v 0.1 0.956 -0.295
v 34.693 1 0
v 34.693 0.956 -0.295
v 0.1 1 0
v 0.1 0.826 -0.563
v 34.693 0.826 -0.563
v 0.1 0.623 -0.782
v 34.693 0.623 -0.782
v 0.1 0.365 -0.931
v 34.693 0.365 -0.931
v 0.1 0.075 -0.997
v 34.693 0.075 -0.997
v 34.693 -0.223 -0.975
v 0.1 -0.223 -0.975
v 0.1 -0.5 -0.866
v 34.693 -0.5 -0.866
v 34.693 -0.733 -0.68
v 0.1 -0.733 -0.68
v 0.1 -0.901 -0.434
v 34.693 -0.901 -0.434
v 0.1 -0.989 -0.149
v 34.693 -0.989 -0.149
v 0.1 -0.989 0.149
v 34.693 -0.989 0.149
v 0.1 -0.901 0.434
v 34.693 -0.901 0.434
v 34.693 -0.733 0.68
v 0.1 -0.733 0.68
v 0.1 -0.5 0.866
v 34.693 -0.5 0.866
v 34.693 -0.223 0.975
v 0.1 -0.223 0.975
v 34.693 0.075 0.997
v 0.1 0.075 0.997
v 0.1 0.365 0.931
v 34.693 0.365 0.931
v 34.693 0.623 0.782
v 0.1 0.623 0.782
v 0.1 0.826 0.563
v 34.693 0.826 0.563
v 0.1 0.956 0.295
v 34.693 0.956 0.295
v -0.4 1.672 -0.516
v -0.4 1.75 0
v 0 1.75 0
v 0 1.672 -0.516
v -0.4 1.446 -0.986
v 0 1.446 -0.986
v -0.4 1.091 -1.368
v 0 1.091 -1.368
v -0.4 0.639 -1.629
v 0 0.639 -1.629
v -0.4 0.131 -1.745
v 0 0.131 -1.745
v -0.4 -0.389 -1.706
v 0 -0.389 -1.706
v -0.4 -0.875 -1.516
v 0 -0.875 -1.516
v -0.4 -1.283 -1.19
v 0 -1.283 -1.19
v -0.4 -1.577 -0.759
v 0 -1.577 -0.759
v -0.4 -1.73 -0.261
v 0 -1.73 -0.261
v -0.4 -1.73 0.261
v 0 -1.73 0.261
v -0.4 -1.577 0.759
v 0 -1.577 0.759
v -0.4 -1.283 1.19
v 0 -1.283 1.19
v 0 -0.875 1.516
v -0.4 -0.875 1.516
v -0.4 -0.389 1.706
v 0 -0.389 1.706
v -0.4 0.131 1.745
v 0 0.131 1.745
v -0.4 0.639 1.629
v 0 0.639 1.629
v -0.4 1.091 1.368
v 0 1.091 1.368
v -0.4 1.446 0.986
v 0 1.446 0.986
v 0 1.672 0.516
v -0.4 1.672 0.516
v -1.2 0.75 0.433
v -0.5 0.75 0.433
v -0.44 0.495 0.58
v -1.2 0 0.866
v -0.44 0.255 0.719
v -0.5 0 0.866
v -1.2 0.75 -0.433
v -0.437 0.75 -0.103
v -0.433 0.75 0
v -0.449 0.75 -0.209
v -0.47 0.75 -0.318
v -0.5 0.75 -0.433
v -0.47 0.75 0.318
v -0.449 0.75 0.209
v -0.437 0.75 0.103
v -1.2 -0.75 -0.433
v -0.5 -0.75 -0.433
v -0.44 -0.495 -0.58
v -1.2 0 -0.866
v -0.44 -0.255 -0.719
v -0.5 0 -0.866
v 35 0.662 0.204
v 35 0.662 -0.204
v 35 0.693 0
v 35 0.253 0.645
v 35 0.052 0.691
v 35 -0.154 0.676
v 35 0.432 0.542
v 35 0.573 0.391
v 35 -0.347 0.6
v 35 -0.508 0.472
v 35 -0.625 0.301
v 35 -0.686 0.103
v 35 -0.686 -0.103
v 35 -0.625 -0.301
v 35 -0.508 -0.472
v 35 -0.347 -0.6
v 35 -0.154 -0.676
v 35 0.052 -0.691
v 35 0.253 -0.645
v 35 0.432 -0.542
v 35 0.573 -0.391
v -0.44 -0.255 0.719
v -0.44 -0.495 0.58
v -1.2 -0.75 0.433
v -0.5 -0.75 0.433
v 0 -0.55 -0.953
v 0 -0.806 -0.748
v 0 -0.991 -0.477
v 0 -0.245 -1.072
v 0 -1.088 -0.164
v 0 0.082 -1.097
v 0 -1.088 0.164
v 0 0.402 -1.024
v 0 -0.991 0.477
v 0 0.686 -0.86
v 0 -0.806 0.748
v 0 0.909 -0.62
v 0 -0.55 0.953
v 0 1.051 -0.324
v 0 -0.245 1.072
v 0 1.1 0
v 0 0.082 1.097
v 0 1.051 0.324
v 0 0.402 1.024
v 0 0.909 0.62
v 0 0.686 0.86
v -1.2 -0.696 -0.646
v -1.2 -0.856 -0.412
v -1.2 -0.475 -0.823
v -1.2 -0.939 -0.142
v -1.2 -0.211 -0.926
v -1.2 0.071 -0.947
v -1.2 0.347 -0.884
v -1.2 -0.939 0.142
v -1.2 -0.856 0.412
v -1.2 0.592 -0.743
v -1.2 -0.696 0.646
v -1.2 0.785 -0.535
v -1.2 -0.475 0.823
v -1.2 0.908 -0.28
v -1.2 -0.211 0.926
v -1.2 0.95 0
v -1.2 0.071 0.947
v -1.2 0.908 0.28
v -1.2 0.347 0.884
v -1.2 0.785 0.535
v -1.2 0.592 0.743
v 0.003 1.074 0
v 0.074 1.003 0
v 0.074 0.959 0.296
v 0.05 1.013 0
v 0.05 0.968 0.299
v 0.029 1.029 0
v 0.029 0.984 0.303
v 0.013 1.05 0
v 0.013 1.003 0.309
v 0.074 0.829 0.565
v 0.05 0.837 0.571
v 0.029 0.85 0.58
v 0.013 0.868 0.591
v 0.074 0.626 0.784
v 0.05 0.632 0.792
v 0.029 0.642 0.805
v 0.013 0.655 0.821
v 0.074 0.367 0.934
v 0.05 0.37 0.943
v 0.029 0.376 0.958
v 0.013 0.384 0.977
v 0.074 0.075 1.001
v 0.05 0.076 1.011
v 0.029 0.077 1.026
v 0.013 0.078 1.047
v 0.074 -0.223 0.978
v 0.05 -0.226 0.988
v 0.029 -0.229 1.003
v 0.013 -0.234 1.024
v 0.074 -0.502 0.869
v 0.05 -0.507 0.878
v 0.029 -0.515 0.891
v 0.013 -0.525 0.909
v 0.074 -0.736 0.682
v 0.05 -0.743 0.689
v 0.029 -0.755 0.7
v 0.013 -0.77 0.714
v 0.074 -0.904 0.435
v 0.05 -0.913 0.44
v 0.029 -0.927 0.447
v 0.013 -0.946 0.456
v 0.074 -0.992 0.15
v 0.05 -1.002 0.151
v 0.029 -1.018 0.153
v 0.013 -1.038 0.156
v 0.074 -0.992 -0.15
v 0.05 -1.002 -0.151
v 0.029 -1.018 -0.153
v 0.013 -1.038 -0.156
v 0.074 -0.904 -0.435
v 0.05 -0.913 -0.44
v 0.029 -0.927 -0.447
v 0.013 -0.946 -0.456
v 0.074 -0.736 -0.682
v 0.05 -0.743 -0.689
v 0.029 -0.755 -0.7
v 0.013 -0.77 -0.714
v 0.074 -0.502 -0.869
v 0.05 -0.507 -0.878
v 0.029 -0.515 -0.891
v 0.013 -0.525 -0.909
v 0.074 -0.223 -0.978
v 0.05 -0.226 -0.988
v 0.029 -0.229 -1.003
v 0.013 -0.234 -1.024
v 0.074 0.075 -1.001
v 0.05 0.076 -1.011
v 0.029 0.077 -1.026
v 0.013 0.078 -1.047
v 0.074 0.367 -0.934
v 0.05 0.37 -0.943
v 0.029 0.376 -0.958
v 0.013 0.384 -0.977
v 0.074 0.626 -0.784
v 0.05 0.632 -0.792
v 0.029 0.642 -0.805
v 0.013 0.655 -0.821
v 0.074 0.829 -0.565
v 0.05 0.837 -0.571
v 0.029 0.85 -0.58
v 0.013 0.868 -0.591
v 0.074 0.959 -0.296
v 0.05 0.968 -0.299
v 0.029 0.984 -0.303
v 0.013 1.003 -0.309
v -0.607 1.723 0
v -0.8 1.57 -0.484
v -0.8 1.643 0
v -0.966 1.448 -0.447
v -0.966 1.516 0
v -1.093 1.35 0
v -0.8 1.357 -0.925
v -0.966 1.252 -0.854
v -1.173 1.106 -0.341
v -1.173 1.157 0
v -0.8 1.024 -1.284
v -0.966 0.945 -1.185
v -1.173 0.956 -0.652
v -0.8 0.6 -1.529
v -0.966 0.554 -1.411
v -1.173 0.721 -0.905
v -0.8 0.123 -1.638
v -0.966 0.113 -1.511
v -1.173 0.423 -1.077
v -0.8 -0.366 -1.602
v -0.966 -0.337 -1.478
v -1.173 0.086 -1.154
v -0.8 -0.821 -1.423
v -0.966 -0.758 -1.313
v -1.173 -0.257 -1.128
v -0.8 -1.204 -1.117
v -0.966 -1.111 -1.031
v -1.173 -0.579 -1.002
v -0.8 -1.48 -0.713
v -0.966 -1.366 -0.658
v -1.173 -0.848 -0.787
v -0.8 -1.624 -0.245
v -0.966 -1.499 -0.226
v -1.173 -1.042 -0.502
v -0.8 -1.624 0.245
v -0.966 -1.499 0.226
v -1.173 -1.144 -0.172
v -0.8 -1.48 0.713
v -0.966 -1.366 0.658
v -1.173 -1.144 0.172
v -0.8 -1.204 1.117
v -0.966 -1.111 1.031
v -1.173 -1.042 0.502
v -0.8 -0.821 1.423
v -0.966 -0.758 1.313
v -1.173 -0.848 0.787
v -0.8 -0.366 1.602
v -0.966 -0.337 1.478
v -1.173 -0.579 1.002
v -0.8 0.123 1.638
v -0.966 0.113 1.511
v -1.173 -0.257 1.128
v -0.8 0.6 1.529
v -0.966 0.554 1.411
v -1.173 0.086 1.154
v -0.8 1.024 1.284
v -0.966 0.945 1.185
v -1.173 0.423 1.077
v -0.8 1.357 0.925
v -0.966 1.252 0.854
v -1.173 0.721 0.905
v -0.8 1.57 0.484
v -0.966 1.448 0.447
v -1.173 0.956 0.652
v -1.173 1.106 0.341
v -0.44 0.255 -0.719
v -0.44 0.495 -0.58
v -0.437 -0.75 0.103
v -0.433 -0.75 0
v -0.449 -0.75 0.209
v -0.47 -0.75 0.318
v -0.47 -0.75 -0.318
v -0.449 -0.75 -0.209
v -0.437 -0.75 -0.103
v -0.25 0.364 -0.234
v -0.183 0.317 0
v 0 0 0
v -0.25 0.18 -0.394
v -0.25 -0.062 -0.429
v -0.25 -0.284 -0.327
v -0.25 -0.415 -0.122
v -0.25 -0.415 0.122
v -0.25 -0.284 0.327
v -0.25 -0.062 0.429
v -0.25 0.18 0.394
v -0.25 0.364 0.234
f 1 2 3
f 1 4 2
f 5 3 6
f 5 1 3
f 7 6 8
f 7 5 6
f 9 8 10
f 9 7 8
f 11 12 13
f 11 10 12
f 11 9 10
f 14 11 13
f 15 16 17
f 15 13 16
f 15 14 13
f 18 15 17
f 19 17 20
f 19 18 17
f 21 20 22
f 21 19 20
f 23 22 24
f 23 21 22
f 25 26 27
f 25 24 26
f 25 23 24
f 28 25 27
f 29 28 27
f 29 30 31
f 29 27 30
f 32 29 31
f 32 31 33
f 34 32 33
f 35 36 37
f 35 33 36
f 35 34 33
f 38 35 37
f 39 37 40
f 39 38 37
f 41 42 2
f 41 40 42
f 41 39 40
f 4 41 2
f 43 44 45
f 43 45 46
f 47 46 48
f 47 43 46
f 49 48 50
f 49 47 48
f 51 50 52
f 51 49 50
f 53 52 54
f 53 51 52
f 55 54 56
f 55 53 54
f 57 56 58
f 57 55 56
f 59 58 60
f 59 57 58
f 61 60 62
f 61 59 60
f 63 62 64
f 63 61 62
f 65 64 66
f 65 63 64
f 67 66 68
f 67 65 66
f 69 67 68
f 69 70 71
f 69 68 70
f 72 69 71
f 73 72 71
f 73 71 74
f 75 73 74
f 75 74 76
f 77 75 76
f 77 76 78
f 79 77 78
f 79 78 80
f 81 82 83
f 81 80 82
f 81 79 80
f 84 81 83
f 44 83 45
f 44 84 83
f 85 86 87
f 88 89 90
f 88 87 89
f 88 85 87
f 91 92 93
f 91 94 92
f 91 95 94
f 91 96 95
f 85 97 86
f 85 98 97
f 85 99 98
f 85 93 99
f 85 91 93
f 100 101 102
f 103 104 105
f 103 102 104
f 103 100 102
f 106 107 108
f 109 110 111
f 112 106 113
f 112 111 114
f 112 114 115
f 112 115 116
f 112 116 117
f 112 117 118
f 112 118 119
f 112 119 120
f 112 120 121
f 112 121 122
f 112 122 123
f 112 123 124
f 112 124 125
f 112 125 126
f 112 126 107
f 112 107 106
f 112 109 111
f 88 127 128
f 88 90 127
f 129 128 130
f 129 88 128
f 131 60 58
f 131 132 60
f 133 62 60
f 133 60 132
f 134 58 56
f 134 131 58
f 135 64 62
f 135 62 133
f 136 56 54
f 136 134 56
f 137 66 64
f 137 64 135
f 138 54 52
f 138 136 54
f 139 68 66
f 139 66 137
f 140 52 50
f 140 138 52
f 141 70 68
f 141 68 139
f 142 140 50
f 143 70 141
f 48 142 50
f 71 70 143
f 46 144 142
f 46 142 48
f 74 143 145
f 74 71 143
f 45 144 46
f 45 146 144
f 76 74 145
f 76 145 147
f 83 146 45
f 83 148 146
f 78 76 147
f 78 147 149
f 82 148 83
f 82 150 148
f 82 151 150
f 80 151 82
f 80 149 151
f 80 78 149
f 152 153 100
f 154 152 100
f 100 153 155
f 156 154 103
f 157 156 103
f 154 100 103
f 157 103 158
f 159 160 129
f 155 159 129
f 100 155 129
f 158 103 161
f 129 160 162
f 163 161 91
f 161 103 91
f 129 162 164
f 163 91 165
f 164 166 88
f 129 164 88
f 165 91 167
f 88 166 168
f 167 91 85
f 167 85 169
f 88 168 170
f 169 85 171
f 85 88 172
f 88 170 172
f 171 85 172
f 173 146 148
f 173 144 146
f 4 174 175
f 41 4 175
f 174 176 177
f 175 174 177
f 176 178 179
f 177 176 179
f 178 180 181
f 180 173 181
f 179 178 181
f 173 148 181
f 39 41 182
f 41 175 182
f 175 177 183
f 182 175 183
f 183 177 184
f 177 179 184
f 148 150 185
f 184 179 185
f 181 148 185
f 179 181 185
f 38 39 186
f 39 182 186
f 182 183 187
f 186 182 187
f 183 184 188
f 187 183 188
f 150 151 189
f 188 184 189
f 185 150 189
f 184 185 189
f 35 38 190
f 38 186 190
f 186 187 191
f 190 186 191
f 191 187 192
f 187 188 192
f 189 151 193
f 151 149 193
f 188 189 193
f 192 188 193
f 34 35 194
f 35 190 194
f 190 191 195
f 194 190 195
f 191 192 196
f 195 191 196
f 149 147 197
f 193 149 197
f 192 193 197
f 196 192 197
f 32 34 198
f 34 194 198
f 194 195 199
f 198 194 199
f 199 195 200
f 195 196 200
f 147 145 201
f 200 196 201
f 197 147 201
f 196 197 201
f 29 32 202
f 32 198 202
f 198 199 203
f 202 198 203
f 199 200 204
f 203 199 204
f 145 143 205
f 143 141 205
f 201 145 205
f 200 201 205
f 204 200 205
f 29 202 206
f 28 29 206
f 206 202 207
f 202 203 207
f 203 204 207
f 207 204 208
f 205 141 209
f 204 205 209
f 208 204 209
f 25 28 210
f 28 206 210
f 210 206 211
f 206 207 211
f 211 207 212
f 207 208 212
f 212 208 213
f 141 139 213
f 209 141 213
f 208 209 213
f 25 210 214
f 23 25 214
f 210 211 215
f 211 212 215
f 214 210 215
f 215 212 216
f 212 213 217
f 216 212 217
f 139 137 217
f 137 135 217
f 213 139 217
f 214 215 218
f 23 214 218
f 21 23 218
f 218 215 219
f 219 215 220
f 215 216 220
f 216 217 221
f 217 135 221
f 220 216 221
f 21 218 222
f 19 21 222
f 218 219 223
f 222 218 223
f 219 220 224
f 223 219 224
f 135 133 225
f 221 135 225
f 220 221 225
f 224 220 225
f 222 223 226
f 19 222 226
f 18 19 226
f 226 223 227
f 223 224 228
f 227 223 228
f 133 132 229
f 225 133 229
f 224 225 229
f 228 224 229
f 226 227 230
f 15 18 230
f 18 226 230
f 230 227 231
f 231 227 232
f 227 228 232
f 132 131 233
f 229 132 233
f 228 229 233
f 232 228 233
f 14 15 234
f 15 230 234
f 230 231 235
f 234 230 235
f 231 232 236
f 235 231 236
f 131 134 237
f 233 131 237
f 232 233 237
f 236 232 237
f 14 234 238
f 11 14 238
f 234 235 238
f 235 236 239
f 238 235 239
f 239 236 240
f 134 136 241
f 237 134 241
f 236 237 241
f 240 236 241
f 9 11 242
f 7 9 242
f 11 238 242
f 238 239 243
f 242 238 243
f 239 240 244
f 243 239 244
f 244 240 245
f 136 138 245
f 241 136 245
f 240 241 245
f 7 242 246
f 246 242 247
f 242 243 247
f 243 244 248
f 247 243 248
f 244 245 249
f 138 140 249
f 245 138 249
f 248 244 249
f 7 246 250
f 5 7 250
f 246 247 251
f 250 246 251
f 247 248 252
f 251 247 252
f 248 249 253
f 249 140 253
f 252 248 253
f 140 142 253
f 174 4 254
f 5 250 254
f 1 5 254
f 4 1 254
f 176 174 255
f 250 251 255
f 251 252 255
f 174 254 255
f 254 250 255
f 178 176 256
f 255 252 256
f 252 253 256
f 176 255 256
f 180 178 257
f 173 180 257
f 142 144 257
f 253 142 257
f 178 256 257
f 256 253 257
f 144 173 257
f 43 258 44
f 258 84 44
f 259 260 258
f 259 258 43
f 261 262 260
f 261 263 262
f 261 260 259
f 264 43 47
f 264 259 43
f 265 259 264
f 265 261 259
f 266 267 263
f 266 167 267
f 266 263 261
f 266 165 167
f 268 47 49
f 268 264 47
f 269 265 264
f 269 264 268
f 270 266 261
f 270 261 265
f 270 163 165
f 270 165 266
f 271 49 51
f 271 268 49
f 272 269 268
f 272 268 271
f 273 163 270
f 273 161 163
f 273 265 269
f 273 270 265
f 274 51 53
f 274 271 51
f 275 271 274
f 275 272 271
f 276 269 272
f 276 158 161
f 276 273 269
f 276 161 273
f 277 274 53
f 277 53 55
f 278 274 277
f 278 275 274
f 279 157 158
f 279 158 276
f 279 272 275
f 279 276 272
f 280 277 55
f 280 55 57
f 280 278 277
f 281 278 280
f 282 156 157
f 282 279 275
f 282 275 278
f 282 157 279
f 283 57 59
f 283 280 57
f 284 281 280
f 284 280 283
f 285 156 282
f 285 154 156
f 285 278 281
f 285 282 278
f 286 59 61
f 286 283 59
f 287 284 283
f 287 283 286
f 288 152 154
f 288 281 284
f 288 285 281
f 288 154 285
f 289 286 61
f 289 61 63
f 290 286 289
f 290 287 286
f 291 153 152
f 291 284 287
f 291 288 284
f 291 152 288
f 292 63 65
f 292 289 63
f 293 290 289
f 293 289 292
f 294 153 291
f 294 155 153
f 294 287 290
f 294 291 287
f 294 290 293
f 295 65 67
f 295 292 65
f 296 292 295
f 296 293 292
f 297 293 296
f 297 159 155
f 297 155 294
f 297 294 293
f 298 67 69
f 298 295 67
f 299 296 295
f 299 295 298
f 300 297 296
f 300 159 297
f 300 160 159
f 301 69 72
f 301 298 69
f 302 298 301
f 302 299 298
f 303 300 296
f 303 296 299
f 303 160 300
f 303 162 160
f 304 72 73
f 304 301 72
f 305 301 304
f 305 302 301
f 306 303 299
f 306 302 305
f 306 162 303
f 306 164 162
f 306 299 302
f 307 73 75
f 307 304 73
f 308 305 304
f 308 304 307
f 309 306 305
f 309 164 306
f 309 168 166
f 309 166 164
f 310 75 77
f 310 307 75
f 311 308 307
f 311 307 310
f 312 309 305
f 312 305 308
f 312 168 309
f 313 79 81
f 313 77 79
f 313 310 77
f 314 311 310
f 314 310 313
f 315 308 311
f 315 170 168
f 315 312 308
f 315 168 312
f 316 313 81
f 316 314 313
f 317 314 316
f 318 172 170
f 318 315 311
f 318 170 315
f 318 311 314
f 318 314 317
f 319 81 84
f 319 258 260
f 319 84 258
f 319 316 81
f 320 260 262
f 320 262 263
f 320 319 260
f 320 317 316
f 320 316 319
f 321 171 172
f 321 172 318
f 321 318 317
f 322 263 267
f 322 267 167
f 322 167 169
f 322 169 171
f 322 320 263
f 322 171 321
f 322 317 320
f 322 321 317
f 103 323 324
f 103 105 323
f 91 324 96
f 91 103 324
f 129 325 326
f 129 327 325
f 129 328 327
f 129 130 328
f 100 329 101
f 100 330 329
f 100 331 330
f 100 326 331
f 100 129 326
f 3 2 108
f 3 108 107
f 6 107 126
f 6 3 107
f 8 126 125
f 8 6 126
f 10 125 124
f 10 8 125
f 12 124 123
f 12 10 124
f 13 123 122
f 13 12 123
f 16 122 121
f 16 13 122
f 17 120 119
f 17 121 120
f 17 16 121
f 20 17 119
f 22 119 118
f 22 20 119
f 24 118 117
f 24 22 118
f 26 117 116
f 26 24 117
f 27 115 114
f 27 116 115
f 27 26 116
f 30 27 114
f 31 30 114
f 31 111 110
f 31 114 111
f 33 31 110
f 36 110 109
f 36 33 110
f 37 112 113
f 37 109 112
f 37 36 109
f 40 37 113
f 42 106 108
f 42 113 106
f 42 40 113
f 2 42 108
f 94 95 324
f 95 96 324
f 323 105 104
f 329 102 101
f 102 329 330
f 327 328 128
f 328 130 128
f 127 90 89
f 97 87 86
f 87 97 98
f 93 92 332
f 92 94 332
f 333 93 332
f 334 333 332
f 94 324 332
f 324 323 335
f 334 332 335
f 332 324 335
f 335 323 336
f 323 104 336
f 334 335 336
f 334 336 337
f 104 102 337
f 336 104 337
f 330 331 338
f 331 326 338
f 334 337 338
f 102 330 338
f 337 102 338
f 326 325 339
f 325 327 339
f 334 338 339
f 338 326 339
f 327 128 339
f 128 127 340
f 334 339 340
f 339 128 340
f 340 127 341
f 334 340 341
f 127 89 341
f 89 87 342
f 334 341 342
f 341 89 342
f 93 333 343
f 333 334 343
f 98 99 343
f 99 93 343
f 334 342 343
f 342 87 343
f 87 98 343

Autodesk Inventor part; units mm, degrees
ref_plane "YZ Plane" through (0, 0, 0) normal (1, 0, 0) x (0, 1, 0)
ref_plane "XZ Plane" through (0, 0, 0) normal (0, 1, 0) x (-1, 0, 0)
sketch "Sketch1" plane through (0, 0, 0) normal (0, 0, 1) x (1, 0, 0)
  line L0 (0, 0) -> (35, 0)
  line L1 (35, 0) -> (35, 1)
  line L2 (35, 1) -> (30.5, 1)
  line L3 (30.5, 1) -> (30.1932, 1)
  line L4 (30.1932, 1) -> (0, 1)
  line L5 (0, 1) -> (0, 1.75)
  line L6 (0, 1.75) -> (-1.2, 1.75)
  line L7 (-1.2, 1.75) -> (-1.2, 0.866)
  line L8 (-1.2, 0.866) -> (-0.5, 0.866)
  line L9 (-0.5, 0.866) -> (0, 0)
  line L10 (-8.44, 0) -> (42.24, 0) projected
  line L11 (0, -0.35) -> (0, 2.1) projected
  line L12 (30.5, 1) -> (0, 1) construction
  dimension "d1" = 4.5
  dimension "d2" = 0.3068
  dimension "d3" = 1.2
  dimension "d4" = 0.7
  dimension "d5" = 60
  dimension "d6" = 2
  dimension "d7" = 2
  dimension "d8" = 1.7321
  dimension "d9" = 3.5
  dimension "d26" = 35
revolve "Body" add sketch "Sketch1" angle 360 about axis through (0, 0, 0) along (1, 0, 0)
sketch "Sketch2" plane through (-1.2, 0, 0) normal (-1, 0, 0) x (0, 0, 1)
  circle A0 centre (0, 0) radius 0.866 projected
  line L0 (0, -2.45) -> (0, 2.45) projected
  line L1 (-2.45, 0) -> (2.45, 0) projected
  line L2 (0.866, 0) -> (0.433, -0.75)
  line L3 (0.433, -0.75) -> (-0.433, -0.75)
  line L4 (-0.433, -0.75) -> (-0.866, 0)
  line L5 (-0.866, 0) -> (-0.433, 0.75)
  line L6 (-0.433, 0.75) -> (0.433, 0.75)
  line L7 (0.433, 0.75) -> (0.866, 0)
extrude "Slot" add sketch "Sketch2" against normal up to next contours L7 A0 | A0 L2 | L6 L0 A0 | A0 L0 L3 | L0 L6 A0 | A0 L3 L0 | L4 A0 | A0 L5
fillet "Fillet1" radius 0.8 1 edges at (-1.2, -1.75, 0)
chamfer "Chamfer1" distance 0.3067 distance2 0.3067 1 edges at (35, -1, 0) measured on face at (35, 0.3333, 0.4421)
ref_plane "Work Plane1" through (29, 0, 0) normal (0, -1, 0) x (1, 0, 0)
fillet "Fillet2" radius 0.1 1 edges at (0, -1, 0)
thread "Thread2" size "M2x0.4" class "6g" standard "ANSI Metric M Profile" full length
equation "\"d15\" = -0.5 * SPD + 0.5 * GD"
equation "\"d16\" = GUL"
equation "\"d1\" = GEL"
equation "\"GD\" = NND"
equation "\"NLG\" = 6"
equation "\"GEL\" = 4.5"
equation "\"KOD\" = 5.7"
equation "\"KOH\" = 1.65"
equation "\"INTI\" = 1.04"
equation "\"GAL\" = 0.61345 * PTC"
equation "\"GUL\" = 0.61345 * PTC"
equation "\"BDM\" = NND"
equation "\"SW\" = 2"
equation "\"RR\" = 1.45"
equation "\"SPD\" = NND - 1.2269 * PTC"
equation "\"R\" = 0.3"
equation "\"TOA\" = 30deg"
equation "\"GD1\" = THREADDIA - 1.2269 * PTC"
equation "\"THREADDIA\" = 3"
equation "\"PTC\" = 0.5"
equation "\"NND\" = 3"
equation "\"KOH1\" = 0.2"
equation "\"E0\" = 2.303"
properties part number "ISO 7380-1 - M3 x 6" material "Stainless Steel"
